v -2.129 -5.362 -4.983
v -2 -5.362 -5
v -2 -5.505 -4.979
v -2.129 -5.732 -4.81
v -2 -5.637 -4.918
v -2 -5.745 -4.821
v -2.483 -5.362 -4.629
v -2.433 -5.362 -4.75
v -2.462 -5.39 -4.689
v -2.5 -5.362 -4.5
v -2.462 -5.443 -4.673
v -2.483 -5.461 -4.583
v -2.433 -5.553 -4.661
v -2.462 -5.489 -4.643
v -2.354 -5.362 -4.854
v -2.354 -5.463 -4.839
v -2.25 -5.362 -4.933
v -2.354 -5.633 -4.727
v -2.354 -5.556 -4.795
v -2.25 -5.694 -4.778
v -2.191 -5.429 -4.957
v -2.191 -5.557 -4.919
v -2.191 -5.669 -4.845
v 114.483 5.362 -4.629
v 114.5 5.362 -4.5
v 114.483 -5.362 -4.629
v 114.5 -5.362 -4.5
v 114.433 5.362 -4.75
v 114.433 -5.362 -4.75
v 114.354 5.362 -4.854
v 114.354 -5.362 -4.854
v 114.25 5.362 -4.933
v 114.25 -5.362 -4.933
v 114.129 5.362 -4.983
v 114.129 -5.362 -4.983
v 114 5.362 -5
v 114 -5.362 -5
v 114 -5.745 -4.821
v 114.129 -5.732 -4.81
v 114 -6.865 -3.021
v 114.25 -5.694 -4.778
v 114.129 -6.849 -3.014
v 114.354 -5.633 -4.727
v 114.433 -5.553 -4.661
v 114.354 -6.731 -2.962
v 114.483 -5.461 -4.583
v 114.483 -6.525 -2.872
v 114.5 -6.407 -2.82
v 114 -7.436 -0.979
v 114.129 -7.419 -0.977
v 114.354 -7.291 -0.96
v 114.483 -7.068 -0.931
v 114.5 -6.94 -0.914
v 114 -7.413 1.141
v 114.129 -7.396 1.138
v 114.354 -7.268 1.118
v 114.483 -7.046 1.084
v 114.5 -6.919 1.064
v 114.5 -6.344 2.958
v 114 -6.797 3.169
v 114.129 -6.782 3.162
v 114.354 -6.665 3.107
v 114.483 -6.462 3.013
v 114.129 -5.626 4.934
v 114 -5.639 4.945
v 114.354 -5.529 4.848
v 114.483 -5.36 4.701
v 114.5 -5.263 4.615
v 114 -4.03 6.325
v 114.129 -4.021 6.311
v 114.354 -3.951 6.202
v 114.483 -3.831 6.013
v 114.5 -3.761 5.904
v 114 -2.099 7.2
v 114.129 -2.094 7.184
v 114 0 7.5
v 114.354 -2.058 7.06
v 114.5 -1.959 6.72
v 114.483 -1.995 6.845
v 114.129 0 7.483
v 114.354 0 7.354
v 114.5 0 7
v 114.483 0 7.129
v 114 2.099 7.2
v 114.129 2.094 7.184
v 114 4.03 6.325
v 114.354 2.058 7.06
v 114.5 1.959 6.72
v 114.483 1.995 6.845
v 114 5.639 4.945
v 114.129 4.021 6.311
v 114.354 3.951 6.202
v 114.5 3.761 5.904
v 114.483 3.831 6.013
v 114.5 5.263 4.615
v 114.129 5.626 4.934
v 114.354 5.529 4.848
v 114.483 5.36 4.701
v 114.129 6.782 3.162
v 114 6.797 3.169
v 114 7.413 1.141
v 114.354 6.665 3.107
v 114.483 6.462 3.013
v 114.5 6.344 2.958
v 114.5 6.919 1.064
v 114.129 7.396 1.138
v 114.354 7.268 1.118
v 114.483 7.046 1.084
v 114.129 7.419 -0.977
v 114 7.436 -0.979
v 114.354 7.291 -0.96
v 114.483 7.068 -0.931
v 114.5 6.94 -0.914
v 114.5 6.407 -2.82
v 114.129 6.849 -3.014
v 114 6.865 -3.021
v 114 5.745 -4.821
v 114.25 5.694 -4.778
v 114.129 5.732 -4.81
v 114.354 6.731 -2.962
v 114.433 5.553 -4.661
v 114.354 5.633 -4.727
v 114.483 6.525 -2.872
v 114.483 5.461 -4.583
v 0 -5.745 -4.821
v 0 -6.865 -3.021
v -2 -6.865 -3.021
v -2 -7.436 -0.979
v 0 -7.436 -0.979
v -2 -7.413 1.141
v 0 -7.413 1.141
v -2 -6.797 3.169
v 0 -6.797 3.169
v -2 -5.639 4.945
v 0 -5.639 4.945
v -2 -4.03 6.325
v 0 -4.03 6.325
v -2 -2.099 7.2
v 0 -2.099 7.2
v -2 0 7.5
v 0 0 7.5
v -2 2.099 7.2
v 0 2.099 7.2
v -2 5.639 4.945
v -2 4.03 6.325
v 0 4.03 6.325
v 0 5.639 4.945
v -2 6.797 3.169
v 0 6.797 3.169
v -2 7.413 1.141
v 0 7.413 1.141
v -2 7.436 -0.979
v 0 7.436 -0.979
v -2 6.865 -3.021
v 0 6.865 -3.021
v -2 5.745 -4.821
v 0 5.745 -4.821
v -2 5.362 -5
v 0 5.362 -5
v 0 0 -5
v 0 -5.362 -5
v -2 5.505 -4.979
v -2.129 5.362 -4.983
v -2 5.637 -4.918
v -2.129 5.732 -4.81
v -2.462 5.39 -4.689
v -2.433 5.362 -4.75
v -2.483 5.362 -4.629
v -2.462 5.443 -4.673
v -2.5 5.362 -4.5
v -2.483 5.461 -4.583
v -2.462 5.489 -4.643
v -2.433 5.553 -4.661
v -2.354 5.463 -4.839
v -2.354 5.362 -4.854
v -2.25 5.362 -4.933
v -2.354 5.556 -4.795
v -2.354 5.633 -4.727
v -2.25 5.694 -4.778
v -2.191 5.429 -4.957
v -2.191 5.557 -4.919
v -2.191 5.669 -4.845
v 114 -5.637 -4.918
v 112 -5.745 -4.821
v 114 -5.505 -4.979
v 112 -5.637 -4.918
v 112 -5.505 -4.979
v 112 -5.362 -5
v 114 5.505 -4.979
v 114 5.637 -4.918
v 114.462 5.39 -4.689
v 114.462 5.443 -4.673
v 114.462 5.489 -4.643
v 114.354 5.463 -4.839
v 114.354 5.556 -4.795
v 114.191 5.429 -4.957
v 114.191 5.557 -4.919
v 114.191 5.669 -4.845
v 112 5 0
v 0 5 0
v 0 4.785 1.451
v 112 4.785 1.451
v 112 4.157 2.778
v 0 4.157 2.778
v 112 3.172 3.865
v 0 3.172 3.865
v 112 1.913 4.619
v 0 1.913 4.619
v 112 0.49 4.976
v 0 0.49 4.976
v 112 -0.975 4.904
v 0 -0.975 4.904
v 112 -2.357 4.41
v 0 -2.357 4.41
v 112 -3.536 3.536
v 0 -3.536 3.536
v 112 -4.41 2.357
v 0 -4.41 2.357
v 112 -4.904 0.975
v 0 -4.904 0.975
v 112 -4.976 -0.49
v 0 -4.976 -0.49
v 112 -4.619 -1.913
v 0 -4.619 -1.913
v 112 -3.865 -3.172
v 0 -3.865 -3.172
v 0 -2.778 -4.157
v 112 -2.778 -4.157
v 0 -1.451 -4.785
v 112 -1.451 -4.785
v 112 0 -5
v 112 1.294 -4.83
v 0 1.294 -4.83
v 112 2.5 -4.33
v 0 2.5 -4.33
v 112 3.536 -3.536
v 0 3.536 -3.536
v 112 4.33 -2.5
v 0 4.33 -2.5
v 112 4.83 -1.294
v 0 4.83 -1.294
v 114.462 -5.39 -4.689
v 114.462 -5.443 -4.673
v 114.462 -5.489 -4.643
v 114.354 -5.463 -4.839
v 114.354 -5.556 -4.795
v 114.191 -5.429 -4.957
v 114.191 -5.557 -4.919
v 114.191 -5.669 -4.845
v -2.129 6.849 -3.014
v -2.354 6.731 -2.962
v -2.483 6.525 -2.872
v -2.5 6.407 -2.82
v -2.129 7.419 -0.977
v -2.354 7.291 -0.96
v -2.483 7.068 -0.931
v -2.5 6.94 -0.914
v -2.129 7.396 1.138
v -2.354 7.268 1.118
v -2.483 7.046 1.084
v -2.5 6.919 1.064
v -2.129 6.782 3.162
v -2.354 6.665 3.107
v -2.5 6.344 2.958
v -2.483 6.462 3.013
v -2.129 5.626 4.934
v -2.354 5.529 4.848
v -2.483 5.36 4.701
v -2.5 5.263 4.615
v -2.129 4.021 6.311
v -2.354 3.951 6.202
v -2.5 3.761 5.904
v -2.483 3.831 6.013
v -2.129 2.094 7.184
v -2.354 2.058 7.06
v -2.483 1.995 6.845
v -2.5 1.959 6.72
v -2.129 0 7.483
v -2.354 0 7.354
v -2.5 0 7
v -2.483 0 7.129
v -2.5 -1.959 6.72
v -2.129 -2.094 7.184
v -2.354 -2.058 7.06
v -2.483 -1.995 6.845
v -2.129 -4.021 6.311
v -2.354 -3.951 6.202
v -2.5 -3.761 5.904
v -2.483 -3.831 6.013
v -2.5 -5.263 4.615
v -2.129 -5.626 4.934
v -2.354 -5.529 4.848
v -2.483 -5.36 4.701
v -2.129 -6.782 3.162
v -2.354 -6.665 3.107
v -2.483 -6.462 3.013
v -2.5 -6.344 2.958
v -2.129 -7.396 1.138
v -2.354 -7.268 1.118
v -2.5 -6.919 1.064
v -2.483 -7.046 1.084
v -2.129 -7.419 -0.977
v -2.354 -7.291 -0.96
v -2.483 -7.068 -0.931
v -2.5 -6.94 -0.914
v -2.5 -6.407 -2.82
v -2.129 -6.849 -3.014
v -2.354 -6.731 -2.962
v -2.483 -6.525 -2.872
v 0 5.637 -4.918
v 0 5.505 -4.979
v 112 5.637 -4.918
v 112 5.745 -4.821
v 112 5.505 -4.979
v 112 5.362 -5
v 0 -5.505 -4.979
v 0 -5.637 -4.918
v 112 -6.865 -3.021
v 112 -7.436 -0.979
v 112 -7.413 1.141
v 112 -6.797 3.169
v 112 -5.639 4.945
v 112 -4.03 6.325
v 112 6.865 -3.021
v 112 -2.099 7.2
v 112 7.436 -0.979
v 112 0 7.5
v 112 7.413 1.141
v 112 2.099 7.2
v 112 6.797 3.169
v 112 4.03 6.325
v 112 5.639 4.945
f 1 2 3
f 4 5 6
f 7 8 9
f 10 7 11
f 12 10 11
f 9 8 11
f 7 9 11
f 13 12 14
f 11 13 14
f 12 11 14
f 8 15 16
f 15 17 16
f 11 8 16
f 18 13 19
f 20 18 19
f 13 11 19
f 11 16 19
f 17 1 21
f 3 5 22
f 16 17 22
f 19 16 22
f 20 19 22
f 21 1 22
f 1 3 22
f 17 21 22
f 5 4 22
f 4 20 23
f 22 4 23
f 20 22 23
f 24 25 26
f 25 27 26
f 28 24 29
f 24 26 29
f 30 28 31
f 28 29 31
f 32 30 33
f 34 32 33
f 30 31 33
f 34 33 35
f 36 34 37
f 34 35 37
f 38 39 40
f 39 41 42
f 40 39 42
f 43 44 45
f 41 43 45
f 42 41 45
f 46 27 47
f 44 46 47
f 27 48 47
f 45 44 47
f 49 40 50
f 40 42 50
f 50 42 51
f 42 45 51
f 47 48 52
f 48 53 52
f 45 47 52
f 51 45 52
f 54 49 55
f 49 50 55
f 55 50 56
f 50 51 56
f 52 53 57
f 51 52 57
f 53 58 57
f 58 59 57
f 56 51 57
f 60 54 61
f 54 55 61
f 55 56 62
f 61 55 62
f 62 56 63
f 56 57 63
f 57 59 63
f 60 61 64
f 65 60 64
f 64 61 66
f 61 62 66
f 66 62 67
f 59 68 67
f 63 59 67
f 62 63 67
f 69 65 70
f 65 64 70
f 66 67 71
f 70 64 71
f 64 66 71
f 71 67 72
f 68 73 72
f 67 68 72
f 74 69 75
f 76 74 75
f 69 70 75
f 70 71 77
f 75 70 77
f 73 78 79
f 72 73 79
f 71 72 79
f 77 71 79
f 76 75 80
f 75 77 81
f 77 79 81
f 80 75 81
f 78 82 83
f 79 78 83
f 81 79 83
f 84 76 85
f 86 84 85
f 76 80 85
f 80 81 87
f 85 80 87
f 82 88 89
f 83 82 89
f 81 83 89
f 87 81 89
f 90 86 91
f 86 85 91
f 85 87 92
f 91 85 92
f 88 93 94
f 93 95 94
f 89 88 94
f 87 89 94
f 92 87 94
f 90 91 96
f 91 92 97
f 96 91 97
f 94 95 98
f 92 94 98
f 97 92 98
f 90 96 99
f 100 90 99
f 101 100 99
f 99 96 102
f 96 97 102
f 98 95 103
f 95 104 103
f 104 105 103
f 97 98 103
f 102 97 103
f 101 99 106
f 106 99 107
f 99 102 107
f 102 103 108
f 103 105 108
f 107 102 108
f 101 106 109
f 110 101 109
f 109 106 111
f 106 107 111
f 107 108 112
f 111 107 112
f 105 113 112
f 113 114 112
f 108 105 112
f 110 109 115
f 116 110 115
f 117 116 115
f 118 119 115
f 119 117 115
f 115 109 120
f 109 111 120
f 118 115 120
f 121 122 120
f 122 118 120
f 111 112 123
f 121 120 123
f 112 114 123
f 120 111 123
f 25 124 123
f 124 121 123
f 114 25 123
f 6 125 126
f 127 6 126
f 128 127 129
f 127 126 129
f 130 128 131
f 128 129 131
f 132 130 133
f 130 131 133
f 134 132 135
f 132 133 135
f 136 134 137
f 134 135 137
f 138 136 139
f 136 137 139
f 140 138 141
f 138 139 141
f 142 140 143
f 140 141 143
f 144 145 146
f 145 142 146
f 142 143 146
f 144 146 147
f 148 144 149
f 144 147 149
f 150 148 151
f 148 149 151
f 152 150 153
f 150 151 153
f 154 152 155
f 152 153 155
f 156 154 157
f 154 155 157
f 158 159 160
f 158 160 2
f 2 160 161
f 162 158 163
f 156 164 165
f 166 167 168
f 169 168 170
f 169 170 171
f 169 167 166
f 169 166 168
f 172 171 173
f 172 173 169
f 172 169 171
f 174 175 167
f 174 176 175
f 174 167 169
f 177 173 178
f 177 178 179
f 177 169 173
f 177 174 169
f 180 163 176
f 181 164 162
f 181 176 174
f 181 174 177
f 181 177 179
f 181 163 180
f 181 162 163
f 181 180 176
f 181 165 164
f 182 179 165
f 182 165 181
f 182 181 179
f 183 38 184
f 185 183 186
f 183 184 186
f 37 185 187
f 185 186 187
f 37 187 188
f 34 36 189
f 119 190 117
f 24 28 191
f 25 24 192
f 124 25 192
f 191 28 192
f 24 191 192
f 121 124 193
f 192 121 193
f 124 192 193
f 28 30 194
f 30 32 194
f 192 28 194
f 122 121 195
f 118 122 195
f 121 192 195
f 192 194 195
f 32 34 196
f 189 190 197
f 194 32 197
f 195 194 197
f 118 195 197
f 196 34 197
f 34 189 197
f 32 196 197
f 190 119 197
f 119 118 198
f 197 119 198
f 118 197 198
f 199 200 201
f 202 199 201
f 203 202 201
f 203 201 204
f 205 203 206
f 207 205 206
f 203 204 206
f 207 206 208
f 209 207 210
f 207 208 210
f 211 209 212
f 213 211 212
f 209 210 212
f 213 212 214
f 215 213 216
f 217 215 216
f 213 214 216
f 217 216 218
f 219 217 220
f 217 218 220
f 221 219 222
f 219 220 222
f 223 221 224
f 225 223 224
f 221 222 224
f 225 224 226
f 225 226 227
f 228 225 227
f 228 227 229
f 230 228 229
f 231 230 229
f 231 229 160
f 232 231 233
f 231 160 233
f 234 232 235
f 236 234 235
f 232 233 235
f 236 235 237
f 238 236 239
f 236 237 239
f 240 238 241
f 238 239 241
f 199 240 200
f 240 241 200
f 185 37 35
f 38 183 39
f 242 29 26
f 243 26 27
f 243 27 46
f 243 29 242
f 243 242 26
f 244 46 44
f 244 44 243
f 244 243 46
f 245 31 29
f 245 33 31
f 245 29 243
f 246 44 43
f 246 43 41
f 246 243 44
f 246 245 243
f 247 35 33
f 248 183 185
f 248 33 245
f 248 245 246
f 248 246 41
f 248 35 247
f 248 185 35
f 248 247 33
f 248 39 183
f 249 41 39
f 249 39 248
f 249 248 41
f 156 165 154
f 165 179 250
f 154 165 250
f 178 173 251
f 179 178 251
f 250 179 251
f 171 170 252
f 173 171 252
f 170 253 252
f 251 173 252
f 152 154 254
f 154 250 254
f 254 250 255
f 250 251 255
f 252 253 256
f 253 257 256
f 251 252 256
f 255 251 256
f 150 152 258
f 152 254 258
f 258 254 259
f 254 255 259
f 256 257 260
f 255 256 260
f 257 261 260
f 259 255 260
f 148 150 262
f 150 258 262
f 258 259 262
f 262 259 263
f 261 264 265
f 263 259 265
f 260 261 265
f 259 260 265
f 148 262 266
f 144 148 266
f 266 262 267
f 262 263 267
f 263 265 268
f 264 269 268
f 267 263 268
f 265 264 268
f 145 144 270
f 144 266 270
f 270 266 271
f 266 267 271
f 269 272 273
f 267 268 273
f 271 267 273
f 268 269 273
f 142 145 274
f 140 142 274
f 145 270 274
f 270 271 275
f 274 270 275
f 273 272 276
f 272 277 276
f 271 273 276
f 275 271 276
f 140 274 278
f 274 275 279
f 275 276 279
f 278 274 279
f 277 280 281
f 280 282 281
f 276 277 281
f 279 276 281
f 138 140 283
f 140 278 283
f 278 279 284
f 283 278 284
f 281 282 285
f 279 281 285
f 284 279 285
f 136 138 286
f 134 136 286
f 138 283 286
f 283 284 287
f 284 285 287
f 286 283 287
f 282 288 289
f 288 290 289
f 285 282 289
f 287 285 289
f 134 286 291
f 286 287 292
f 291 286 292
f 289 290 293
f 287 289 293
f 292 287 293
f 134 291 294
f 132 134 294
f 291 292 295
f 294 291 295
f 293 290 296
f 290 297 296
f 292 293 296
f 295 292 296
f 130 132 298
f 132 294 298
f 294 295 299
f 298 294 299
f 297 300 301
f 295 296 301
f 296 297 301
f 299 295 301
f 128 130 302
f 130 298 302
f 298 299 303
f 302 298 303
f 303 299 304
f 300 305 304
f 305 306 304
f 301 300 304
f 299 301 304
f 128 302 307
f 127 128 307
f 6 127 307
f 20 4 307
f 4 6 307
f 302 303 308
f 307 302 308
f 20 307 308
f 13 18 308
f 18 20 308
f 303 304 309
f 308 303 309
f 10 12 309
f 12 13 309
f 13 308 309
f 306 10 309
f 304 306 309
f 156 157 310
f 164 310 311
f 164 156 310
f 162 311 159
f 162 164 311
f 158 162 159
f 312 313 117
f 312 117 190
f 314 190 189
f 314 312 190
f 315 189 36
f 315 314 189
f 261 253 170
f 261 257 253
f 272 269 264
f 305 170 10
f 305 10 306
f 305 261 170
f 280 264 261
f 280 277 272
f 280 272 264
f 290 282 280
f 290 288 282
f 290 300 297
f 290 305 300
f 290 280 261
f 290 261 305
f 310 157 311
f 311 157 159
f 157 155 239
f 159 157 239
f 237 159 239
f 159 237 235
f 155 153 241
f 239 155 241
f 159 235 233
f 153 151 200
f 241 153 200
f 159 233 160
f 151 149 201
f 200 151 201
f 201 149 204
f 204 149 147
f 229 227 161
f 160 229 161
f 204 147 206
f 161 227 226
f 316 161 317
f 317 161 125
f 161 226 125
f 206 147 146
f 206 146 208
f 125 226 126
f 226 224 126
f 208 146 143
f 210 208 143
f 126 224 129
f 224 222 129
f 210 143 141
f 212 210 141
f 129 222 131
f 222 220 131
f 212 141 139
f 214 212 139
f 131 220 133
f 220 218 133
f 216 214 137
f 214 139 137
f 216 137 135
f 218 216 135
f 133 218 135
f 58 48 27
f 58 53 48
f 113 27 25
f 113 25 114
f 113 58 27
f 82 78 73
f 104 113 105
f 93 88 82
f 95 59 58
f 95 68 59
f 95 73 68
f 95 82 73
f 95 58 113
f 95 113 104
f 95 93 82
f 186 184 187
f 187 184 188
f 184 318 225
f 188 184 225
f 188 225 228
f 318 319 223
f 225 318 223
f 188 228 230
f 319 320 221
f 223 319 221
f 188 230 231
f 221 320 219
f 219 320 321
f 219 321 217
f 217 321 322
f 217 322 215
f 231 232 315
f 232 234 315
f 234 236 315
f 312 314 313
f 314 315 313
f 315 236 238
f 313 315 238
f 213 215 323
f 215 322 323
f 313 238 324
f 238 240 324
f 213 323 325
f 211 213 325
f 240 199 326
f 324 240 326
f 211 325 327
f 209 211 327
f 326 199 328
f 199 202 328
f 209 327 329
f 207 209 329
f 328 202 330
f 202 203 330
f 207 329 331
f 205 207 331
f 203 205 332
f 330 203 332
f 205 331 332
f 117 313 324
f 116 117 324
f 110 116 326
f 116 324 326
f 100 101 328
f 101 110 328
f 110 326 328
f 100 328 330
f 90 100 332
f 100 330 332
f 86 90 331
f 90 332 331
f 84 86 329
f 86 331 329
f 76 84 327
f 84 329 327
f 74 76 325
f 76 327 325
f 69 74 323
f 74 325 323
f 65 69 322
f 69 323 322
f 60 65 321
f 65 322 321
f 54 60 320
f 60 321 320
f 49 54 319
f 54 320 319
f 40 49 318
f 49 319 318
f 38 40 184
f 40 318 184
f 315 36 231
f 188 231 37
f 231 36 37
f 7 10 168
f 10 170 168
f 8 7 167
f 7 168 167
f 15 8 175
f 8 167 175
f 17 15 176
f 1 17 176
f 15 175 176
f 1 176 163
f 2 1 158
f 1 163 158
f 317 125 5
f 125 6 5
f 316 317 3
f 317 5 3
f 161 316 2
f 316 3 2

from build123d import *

# Parameters (mm, degrees)
F0_R     = 5
F1_DEPTH = 112
F2_R     = 7.5
F3_DEPTH = 2.5
F4_R     = 7.5
F5_DEPTH = 2.5
F7_DEPTH = 117.001
F8_R     = 0.5


with BuildPart() as f1:
    # F0 (on Right) → F1 (new body)
    with BuildSketch(Plane.YZ):
        Circle(F0_R)
    extrude(amount=F1_DEPTH)

    # F2 (on face) → F3 (join)
    with BuildSketch(Plane(origin=(0, 0, 0), x_dir=(0, -1, 0), z_dir=(-1, 0, 0))):
        Circle(F2_R)
    extrude(amount=F3_DEPTH)

    # F4 (on face) → F5 (join)
    with BuildSketch(Plane.YZ.offset(112)):
        Circle(F4_R)
    extrude(amount=F5_DEPTH)

    # F6 (on face) → F7 (cut, through all)
    with BuildSketch(Plane.YZ.offset(114.5)):
        with BuildLine():
            Line((5.5901699437, -5), (-5.5901699437, -5))
            ThreePointArc((-5.5901699437, -5), (0, -7.5), (5.5901699437, -5))
        make_face()
    extrude(amount=-F7_DEPTH, mode=Mode.SUBTRACT)

    # F8
    f8_edges = [f1.edges().sort_by_distance(p)[0] for p in [
        (-2.5, 0, -5),
        (-2.5, 0, 7.5),
        (114.5, 0, -5),
        (114.5, 0, 7.5),
        (113.25, -5.59017, -5),
        (113.25, 5.59017, -5),
        (-1.25, -5.59017, -5),
        (-1.25, 5.59017, -5),
    ]]
    fillet(f8_edges, radius=F8_R)


solid = f1.part
